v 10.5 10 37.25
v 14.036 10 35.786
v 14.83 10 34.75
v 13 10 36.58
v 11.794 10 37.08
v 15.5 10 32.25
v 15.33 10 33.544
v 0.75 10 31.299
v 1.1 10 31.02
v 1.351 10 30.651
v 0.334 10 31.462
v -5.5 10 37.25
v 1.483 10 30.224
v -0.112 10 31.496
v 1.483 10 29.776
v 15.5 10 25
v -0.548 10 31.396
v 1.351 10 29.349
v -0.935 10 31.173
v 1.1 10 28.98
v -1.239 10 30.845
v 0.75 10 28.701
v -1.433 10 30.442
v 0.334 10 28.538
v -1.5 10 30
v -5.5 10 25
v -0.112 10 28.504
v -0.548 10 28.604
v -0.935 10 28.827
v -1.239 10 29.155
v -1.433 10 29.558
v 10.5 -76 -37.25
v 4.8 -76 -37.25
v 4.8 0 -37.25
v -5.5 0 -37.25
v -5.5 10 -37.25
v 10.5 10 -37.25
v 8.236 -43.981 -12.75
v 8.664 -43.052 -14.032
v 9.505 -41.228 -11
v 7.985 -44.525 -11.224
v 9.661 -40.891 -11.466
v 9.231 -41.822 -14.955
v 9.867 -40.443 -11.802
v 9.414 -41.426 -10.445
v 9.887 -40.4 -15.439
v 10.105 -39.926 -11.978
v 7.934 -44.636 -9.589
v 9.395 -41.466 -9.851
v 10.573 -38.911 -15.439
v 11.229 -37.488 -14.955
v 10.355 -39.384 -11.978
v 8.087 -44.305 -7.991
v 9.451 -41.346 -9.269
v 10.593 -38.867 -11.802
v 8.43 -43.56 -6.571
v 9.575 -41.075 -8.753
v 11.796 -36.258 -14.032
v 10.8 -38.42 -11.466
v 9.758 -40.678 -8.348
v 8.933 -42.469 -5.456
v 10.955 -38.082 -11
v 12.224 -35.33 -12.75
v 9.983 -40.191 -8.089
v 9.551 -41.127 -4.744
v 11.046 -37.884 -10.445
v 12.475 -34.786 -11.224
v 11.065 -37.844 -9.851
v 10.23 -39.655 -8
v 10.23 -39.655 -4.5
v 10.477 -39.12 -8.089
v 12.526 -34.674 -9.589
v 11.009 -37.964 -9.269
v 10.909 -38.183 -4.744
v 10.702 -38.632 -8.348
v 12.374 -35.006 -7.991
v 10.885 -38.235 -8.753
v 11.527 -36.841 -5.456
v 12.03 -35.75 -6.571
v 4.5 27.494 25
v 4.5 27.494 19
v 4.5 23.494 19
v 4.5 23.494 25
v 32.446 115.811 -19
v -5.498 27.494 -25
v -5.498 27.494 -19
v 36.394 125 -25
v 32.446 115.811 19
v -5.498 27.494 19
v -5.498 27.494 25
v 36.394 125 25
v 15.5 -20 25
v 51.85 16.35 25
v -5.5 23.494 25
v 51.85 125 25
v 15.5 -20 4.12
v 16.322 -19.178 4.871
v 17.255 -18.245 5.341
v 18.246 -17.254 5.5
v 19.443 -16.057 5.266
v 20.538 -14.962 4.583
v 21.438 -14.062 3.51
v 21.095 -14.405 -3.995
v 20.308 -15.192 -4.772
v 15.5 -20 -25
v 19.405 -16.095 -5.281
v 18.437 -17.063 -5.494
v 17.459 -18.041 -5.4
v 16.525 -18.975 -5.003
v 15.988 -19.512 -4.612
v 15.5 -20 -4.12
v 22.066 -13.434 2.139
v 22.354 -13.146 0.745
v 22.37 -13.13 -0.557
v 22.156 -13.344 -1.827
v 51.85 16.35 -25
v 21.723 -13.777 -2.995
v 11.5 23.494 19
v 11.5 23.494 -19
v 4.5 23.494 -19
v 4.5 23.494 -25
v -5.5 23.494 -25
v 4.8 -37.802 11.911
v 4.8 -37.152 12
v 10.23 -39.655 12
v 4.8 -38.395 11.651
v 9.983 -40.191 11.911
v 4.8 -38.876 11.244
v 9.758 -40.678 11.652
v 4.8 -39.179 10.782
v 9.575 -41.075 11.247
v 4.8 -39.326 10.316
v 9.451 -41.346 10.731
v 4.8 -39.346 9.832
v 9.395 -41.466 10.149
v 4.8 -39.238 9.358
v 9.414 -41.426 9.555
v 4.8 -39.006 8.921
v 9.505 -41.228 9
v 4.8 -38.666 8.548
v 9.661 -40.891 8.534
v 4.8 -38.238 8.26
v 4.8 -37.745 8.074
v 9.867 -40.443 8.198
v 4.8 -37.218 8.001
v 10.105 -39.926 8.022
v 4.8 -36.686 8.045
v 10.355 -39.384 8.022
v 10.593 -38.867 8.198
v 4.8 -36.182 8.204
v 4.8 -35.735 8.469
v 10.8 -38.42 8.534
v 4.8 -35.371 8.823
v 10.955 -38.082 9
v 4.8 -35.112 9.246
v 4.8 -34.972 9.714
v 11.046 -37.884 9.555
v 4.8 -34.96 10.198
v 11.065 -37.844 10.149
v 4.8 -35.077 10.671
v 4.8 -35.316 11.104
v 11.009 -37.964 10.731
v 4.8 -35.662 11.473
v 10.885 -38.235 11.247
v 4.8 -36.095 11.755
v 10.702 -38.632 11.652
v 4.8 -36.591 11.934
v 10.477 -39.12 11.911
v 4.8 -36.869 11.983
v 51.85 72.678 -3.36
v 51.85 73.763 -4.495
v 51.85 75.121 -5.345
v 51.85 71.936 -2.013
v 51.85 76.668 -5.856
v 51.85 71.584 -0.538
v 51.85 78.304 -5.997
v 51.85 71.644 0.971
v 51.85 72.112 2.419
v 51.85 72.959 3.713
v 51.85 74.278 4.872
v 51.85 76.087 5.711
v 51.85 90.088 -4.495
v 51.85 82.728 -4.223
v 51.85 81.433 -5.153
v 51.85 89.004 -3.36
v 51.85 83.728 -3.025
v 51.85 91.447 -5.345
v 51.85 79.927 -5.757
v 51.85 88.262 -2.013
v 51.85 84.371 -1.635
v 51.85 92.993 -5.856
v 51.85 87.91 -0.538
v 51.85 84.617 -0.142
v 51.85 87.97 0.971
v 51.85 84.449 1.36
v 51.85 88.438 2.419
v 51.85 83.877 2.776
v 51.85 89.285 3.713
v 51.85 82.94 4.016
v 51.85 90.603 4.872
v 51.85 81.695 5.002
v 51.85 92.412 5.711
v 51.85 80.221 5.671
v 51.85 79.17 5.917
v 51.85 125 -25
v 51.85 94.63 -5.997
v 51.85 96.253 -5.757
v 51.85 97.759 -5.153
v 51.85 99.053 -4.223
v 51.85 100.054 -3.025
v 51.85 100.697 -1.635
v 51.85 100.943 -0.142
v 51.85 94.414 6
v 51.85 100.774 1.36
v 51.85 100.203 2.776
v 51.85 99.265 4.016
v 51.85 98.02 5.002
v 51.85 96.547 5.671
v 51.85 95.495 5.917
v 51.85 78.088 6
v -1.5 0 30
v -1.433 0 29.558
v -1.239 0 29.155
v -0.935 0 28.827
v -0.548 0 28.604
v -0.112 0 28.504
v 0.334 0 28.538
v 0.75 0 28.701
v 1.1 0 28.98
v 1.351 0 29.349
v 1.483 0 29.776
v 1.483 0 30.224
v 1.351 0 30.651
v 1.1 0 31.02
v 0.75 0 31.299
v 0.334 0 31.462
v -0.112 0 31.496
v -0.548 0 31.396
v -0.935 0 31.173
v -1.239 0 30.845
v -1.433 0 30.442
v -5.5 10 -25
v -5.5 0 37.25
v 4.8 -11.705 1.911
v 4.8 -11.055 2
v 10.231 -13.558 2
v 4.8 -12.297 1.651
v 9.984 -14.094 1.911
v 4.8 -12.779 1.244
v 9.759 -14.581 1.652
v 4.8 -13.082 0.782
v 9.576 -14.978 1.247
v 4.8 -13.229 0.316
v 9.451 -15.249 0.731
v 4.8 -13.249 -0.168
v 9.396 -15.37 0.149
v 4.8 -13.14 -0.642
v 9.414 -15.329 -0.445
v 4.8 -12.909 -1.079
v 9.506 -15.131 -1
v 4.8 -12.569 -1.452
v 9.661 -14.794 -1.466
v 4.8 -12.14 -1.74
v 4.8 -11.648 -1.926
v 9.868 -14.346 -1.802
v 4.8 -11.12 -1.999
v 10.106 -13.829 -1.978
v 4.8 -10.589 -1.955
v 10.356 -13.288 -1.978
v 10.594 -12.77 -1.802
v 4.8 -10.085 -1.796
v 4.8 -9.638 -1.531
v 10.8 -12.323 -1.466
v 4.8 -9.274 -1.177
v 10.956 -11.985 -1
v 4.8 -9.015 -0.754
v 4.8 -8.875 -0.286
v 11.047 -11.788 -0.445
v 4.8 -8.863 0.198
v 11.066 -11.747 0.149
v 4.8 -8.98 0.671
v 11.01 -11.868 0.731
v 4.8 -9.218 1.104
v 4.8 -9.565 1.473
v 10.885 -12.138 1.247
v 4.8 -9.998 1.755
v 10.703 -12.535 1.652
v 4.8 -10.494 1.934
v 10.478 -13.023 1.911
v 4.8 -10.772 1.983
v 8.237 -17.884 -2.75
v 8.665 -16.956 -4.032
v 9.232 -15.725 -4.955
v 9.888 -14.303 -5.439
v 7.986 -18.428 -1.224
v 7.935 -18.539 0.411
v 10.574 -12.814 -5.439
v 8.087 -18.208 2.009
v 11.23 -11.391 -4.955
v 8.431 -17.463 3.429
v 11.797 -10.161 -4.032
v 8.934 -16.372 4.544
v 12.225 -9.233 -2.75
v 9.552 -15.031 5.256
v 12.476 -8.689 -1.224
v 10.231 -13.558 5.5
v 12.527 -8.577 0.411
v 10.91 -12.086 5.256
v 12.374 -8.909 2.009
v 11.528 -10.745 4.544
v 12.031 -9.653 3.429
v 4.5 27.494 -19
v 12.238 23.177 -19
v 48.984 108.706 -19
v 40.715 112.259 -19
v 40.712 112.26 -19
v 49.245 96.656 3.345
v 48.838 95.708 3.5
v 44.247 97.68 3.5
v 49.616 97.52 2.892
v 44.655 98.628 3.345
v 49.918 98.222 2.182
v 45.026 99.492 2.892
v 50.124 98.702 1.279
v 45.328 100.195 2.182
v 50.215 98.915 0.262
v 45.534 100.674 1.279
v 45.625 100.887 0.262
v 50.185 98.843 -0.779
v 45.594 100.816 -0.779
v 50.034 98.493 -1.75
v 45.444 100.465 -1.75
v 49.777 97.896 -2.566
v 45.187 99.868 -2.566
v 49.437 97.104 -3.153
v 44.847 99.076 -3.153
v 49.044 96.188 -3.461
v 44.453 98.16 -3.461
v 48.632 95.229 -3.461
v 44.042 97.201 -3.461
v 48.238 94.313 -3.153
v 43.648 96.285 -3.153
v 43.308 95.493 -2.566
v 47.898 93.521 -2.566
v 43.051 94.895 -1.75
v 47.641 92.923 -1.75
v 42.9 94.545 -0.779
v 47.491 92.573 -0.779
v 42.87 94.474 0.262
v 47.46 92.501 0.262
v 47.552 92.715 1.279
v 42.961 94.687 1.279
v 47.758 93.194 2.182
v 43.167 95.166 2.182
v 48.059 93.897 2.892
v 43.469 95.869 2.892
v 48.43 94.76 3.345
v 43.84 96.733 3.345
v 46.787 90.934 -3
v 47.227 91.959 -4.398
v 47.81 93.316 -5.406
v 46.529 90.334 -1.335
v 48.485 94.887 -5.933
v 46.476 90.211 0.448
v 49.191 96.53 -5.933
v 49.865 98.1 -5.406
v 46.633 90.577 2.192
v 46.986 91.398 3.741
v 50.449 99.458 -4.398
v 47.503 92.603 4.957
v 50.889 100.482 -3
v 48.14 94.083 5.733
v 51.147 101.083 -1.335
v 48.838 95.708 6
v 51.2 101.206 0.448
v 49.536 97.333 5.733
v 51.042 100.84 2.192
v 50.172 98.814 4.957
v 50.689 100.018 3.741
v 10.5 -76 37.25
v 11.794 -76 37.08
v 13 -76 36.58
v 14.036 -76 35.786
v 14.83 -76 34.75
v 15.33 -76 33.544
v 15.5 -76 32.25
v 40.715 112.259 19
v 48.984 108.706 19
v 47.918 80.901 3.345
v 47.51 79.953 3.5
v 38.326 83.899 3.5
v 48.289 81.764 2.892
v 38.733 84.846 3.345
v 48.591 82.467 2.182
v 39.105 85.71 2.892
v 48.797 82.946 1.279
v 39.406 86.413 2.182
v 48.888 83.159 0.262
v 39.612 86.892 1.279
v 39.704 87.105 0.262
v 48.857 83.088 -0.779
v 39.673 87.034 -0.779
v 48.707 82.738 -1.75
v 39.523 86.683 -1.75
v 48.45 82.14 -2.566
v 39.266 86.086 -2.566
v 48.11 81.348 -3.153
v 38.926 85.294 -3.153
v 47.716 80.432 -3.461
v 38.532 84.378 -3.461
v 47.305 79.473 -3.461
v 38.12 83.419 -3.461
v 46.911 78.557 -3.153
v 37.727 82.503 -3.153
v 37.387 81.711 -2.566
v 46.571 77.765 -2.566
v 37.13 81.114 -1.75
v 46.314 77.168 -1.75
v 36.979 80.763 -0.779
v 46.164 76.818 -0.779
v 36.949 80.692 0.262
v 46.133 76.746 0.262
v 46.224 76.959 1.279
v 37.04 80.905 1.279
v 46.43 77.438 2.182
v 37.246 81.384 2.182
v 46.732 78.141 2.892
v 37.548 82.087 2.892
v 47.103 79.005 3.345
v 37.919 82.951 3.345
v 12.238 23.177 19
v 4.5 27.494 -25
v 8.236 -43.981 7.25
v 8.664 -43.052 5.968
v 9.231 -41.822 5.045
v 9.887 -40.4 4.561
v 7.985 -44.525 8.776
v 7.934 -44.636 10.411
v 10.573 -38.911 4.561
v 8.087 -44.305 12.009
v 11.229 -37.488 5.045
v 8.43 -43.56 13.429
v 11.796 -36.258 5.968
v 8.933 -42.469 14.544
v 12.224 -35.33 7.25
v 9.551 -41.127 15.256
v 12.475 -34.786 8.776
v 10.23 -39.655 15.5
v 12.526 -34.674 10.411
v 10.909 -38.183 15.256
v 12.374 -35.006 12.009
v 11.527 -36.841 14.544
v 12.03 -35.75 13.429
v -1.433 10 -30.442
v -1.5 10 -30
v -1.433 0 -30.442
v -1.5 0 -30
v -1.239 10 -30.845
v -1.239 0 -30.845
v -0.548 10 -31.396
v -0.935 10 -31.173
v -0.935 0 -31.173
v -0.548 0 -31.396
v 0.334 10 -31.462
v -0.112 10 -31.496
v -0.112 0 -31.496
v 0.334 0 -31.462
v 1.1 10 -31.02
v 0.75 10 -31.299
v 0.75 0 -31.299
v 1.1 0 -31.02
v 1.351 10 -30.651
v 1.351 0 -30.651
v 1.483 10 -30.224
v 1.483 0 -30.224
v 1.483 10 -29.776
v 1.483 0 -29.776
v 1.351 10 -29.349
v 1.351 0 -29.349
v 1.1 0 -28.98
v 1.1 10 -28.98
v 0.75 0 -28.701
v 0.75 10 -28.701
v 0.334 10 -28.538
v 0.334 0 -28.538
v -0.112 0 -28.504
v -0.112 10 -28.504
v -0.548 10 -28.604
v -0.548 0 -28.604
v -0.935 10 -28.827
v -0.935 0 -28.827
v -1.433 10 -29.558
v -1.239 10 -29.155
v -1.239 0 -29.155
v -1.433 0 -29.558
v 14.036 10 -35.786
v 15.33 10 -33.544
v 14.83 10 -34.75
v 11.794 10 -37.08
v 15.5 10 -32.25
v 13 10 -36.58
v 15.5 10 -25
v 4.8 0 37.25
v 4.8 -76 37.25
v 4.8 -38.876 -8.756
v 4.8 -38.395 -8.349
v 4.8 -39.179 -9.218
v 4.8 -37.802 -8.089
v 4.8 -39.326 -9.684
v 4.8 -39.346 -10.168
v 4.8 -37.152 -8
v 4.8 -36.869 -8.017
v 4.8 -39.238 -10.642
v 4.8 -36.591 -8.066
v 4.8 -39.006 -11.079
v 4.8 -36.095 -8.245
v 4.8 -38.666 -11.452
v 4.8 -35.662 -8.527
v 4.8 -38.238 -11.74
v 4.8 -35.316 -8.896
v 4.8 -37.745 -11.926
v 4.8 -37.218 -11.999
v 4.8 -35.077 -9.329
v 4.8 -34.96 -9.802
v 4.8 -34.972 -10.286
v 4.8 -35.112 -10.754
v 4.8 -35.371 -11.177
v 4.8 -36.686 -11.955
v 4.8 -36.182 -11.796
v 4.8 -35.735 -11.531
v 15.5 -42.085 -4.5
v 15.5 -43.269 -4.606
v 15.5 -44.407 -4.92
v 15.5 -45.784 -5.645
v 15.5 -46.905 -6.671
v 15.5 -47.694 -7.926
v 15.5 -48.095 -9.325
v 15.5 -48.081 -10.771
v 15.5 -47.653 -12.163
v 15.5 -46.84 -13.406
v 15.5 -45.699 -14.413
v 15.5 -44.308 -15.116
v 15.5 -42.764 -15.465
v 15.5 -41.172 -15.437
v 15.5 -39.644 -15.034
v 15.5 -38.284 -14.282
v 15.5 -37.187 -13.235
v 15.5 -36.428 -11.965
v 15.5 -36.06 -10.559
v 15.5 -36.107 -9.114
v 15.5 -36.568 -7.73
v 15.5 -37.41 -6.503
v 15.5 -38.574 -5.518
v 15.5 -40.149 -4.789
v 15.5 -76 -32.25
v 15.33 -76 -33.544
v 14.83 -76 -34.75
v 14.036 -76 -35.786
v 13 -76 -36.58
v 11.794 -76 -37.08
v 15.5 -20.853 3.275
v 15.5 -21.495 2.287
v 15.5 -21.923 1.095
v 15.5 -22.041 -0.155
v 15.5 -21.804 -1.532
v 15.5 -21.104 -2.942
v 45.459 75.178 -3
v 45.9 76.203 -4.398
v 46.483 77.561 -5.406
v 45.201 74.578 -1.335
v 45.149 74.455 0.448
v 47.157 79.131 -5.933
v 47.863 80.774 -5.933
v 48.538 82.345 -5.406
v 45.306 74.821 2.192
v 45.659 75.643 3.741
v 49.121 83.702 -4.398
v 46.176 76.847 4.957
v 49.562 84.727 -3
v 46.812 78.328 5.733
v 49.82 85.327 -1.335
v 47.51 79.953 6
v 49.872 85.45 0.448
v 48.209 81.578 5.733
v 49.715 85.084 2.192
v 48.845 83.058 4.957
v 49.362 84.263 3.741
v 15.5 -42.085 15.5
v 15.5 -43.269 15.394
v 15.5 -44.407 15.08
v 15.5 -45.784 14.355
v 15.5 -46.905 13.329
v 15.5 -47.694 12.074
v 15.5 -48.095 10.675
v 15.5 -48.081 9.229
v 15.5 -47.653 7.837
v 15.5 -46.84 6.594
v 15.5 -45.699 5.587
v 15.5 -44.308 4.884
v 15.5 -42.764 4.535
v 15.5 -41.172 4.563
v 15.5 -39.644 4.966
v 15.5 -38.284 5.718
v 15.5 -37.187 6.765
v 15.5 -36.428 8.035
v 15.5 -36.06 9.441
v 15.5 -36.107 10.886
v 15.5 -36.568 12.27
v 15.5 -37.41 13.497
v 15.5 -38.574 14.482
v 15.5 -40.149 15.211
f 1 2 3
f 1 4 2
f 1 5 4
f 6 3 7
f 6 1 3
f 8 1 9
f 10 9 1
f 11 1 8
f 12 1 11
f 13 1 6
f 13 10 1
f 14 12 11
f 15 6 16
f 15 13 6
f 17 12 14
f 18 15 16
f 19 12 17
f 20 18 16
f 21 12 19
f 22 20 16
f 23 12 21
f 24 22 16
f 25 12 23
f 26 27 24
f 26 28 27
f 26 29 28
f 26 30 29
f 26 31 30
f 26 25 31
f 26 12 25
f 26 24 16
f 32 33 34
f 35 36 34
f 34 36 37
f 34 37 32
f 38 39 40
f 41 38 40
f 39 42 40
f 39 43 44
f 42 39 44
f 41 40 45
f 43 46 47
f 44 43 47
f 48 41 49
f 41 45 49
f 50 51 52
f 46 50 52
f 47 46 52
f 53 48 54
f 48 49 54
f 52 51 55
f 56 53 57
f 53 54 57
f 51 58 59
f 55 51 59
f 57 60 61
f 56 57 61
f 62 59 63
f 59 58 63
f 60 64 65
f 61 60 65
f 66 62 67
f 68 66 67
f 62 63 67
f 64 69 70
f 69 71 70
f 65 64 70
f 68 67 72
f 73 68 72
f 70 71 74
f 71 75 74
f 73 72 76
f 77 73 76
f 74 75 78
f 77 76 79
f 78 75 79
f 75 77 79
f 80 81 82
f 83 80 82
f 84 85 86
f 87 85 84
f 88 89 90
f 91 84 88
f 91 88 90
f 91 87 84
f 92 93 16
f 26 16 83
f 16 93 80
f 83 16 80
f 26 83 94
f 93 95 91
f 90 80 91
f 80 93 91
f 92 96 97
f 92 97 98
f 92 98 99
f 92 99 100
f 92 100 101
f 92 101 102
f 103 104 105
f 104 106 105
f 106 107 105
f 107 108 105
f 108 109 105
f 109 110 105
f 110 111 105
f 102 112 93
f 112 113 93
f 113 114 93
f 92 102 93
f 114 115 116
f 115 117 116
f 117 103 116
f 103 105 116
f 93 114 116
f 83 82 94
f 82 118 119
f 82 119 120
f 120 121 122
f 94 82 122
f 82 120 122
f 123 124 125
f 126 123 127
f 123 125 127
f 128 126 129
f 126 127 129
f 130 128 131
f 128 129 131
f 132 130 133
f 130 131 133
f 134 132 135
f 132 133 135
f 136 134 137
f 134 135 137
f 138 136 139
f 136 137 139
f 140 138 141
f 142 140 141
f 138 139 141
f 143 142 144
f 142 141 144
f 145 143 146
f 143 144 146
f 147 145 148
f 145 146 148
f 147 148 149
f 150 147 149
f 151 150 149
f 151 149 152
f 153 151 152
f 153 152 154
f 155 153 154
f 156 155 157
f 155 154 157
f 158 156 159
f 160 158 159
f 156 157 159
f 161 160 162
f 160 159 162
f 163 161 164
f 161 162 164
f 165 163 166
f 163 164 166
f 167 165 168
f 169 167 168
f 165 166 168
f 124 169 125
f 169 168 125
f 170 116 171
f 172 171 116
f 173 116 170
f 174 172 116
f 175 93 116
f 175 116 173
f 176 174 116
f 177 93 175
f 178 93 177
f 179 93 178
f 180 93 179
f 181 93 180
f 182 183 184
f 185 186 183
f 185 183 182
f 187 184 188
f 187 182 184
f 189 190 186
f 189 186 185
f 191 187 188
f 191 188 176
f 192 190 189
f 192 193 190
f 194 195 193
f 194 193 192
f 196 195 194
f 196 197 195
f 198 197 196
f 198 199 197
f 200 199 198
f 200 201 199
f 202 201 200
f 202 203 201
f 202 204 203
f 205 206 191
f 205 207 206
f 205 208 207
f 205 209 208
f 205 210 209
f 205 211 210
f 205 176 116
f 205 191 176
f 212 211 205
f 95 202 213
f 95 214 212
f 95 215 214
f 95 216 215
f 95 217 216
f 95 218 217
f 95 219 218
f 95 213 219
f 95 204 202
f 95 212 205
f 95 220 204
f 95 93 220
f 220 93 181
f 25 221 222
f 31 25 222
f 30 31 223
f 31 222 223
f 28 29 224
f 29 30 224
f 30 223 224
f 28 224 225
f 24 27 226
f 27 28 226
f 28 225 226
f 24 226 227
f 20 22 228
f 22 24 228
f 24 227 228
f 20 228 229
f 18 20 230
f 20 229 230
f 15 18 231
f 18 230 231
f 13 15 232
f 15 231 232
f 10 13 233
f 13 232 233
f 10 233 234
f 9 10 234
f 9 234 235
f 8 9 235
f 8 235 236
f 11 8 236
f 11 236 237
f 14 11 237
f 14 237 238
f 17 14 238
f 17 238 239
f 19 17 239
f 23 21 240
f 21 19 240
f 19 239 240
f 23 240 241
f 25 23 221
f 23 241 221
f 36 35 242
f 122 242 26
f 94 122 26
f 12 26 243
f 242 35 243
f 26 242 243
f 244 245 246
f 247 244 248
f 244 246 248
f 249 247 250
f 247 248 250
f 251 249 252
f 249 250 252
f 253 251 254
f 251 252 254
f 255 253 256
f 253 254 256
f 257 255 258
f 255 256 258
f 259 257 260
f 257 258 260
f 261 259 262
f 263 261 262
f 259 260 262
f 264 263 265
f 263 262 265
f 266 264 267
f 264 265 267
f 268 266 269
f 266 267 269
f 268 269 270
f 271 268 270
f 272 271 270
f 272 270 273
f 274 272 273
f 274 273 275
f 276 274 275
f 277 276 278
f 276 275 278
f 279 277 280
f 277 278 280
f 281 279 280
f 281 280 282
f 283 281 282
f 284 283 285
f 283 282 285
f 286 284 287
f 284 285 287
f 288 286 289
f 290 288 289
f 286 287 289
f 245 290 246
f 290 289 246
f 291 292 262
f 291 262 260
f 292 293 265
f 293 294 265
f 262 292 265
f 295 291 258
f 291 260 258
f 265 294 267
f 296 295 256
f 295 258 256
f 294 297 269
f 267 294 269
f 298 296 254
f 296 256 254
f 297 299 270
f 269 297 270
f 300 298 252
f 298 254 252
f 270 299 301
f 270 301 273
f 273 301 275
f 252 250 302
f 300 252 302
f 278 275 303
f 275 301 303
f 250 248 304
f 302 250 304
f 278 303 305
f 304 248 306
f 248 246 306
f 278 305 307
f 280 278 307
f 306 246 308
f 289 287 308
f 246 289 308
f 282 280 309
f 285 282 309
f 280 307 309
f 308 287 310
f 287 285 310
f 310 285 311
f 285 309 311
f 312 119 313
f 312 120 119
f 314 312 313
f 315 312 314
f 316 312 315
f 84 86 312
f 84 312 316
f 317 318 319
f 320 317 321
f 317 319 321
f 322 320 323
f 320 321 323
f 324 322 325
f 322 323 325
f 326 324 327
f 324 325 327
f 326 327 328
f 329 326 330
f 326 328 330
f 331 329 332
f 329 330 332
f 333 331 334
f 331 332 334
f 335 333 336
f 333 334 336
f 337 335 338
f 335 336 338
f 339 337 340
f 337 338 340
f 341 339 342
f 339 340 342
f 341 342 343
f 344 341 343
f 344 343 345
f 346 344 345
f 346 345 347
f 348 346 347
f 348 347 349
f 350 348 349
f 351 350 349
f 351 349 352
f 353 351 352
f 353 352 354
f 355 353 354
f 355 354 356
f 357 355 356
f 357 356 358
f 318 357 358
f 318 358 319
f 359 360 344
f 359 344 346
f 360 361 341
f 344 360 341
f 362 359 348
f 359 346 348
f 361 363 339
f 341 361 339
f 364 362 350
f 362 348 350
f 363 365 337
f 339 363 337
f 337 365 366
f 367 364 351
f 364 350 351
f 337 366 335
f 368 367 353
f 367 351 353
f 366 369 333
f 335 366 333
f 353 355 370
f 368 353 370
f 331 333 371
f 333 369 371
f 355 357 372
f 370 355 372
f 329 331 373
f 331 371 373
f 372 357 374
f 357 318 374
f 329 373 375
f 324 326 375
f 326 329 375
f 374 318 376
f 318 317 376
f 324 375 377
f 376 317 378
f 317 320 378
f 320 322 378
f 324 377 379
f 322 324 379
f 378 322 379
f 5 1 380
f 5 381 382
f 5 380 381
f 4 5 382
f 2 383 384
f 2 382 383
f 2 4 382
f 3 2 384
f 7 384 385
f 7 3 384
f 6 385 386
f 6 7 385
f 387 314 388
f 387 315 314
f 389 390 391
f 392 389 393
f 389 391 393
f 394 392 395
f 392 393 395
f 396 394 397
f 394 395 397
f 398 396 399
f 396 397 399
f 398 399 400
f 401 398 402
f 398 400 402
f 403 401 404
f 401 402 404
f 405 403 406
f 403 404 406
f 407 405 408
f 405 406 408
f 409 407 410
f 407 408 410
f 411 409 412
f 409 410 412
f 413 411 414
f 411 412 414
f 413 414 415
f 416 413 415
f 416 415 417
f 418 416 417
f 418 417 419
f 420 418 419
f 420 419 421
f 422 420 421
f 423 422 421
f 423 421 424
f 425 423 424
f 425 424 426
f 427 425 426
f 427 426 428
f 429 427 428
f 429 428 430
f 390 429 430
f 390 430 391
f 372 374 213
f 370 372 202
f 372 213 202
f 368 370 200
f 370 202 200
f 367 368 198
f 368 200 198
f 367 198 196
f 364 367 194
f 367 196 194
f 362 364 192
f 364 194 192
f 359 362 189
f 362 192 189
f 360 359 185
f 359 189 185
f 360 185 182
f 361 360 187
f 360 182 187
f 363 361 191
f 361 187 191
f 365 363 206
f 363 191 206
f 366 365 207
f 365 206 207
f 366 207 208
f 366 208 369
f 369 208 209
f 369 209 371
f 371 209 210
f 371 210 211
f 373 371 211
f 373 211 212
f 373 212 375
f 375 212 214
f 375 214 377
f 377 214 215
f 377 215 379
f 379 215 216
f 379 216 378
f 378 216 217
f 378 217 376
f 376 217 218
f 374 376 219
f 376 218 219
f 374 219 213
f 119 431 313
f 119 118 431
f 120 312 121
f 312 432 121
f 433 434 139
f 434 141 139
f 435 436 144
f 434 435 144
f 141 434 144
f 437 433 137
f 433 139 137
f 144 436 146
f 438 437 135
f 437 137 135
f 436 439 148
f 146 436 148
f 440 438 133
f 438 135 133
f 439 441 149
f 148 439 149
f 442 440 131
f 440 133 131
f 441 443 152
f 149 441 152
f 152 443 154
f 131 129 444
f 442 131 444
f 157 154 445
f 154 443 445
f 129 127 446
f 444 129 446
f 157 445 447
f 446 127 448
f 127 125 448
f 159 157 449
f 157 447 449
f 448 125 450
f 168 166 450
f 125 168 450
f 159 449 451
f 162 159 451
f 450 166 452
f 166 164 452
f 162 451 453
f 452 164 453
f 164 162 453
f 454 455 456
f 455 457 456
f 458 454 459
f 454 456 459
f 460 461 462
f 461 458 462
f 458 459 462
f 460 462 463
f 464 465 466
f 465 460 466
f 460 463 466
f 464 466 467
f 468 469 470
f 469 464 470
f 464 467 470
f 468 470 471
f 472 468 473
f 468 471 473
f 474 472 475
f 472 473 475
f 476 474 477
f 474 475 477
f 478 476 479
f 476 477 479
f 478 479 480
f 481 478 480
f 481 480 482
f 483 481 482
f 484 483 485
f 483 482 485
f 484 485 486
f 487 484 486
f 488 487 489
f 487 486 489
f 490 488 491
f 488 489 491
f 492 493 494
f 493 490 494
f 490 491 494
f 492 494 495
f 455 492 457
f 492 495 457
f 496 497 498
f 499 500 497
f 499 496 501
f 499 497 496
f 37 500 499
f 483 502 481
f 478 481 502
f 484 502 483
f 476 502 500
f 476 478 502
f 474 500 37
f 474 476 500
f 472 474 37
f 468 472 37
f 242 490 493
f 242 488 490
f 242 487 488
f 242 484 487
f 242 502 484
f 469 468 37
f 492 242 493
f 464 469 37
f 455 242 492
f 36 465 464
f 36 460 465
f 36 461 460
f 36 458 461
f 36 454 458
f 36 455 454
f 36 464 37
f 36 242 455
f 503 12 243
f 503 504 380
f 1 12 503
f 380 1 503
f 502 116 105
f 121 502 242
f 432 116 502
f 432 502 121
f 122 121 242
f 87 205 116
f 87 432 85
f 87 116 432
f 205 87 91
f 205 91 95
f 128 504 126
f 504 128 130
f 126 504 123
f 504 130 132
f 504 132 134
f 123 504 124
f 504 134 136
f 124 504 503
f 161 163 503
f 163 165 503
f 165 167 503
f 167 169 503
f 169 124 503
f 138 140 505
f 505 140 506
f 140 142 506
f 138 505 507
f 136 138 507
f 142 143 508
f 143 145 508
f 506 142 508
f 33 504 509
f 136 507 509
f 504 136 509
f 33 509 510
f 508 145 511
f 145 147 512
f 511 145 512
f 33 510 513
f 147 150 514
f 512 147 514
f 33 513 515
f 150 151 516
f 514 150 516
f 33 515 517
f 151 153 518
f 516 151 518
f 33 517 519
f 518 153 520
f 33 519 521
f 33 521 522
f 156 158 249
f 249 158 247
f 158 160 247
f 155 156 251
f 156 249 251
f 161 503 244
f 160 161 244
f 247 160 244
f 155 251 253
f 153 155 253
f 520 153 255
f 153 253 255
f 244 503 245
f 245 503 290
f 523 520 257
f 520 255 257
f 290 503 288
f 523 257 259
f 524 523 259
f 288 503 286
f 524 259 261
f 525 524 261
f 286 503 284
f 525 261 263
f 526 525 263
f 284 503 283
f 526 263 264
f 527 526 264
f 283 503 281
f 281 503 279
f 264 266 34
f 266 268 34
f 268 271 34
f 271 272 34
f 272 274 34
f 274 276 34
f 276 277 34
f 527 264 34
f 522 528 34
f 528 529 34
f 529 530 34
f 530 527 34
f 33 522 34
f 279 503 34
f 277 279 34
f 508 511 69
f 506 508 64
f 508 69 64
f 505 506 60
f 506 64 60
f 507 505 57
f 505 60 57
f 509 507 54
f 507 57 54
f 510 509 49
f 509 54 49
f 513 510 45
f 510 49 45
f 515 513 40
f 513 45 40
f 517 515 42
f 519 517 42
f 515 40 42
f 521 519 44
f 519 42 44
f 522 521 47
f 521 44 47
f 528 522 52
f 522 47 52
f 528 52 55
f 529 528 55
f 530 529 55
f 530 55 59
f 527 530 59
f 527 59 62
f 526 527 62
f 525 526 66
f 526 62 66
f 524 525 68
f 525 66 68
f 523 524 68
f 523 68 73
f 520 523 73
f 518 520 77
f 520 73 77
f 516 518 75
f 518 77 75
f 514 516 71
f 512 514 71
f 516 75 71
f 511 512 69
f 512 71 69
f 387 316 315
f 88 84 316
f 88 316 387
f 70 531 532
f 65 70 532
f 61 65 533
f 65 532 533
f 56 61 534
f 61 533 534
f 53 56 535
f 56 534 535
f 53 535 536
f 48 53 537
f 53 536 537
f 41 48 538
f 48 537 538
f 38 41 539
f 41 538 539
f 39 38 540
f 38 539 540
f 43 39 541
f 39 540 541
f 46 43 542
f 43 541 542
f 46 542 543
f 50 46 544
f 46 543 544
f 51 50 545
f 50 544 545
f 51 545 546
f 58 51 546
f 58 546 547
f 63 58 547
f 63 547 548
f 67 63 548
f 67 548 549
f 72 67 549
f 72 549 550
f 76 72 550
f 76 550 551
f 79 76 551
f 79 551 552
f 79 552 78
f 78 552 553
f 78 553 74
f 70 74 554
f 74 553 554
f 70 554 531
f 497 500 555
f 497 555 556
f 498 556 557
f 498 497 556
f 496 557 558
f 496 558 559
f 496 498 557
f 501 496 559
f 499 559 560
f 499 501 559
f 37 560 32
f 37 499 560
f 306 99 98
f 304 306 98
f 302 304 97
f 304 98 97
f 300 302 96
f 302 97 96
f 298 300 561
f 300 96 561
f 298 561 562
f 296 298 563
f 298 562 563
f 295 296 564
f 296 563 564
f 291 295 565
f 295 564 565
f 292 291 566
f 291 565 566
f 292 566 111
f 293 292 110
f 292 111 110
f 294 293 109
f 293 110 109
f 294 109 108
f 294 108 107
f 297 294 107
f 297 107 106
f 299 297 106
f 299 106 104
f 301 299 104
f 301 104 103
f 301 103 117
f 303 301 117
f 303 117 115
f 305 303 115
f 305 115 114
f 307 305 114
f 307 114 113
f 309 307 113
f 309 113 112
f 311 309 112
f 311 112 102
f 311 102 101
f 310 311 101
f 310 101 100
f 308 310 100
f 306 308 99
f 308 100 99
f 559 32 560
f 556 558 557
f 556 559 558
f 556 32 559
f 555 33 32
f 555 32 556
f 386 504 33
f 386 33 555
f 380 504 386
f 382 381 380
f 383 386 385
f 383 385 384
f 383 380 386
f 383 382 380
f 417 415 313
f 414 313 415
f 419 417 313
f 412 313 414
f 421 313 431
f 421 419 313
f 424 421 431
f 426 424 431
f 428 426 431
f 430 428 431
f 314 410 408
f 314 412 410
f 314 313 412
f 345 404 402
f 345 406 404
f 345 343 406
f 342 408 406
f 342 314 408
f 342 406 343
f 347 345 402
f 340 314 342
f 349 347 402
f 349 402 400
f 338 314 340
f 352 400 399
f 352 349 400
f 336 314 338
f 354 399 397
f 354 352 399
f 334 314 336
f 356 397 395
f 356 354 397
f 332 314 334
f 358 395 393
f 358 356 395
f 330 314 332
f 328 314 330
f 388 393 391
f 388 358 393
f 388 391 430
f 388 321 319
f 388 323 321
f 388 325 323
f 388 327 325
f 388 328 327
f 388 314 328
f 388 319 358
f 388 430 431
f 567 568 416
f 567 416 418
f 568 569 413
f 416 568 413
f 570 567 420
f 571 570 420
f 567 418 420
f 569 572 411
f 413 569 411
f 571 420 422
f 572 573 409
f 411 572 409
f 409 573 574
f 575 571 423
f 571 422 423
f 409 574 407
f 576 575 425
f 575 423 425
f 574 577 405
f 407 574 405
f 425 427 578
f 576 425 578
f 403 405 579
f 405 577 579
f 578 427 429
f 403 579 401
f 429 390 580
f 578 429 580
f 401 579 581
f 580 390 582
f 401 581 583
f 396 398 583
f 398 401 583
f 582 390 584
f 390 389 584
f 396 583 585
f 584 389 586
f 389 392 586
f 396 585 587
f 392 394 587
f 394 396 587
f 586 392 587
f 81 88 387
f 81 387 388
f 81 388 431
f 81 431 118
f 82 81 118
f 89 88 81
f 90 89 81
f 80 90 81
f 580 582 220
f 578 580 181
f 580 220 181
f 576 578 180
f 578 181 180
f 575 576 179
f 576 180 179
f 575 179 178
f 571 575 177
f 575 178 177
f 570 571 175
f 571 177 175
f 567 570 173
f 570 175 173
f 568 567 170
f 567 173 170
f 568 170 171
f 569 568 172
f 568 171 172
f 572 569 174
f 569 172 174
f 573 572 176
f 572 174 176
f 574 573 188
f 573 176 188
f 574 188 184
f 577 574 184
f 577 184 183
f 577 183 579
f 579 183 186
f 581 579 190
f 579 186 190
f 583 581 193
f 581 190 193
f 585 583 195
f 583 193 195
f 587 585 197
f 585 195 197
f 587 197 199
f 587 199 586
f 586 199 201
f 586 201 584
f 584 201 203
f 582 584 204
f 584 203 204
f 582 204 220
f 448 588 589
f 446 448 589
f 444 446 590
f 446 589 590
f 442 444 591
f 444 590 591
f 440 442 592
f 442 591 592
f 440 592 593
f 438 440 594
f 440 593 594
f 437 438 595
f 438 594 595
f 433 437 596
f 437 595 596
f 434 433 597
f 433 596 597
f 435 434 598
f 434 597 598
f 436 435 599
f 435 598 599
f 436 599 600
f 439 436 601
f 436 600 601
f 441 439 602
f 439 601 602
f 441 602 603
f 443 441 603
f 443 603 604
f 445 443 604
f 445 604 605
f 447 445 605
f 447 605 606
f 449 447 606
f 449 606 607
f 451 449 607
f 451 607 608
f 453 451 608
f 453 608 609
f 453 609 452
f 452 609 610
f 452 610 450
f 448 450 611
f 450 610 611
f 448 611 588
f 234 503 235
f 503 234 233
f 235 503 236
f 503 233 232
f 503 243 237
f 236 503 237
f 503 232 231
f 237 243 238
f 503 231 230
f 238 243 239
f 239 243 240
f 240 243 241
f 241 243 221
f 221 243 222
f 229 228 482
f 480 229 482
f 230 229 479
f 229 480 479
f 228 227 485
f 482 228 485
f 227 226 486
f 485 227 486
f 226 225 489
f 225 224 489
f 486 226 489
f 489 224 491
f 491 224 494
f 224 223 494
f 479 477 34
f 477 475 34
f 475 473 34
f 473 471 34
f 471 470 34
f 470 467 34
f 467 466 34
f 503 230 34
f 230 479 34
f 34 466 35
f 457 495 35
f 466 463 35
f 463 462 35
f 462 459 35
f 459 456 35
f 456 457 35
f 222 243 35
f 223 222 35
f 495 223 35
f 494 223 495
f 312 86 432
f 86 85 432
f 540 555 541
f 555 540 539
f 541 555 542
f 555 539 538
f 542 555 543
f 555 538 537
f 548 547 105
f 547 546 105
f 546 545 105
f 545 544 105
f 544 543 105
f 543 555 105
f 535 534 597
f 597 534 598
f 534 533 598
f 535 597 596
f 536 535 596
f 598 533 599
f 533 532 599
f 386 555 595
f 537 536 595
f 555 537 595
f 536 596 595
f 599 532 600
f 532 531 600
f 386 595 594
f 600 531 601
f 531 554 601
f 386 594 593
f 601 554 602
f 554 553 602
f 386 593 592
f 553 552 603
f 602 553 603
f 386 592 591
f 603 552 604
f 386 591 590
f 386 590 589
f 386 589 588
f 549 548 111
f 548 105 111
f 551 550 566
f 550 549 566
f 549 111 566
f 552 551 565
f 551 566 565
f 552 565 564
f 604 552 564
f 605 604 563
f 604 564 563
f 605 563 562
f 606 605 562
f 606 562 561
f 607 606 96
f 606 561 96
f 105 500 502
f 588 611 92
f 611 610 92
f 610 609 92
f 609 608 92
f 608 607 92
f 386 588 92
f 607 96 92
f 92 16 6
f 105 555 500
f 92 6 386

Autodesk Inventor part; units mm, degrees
sketch "Sketch1" plane through (0, 0, 0) normal (0, 1, 0) x (-1, 0, 0)
  line L0 (5.5, 37.25) -> (-5.5, 37.25)
  line L1 (-5.5, 37.25) -> (-5.5, -37.25)
  line L2 (-5.5, -37.25) -> (5.5, -37.25)
  line L3 (5.5, -37.25) -> (5.5, 37.25)
  line L4 (5.5, 37.25) -> (-5.5, -37.25) construction
  line L5 (-5.5, 37.25) -> (5.5, -37.25) construction
  circle A0 centre (0, 30) radius 1.5
  line L6 (5.5, 0) -> (-5.5, 0)
  circle A1 centre (0, -30) radius 1.5
  line L7 (-5.5, -25) -> (5.5, -25)
  line L8 (5.5, -25) -> (5.5, 25)
  line L9 (5.5, 25) -> (-5.5, 25)
  line L10 (-5.5, 25) -> (-5.5, -25)
  line L11 (-5.5, -25) -> (5.5, 25) construction
  line L12 (5.5, -25) -> (-5.5, 25) construction
  point P0 (0, 0)
  dimension "d0" = 11
  dimension "d1" = 74.5
  dimension "d2" = 3
  dimension "d3" = 7.25
  dimension "d28" = 50
extrude "Extrusion1" add sketch "Sketch1" along normal blind 10
sketch "Sketch2" plane through (5.5, 0, 37.25) normal (1, 0, 0) x (0, 0, -1)
  line L0 (0, 10) -> (74.5, 10) projected
  line L1 (0, 0) -> (74.5, 0) projected
  line L2 (0, 10) -> (74.5, 10)
  line L3 (74.5, 10) -> (74.5, 0)
  line L4 (74.5, 0) -> (0, 0)
  line L5 (0, 0) -> (0, 10)
  point P0 (37.25, 0)
extrude "Extrusion2" add sketch "Sketch2" along normal blind 10
sketch "Sketch3" plane through (0, 0, 0) normal (0, -1, 0) x (1, 0, 0)
  line L0 (-5.5, 37.25) -> (15.5, 37.25) projected
  line L1 (-5.5, -37.25) -> (15.5, -37.25) projected
  line L2 (15.5, 37.25) -> (4.8, 37.25)
  line L3 (4.8, 37.25) -> (4.8, -37.25)
  line L4 (4.8, -37.25) -> (15.5, -37.25)
  line L5 (15.5, -37.25) -> (15.5, 37.25)
  point P0 (0, 0)
  dimension "d9" = 10.7
extrude "Extrusion3" add sketch "Sketch3" along normal blind 76
ref_plane "Work Plane1" through (15.5, -76, -37.25) normal (-0.9081432, 0.4186597, 0) x (0, 0, 1)
ref_plane "Work Plane3" through (10.9593, -73.9067, -37.25) normal (-0.9081432, 0.4186597, 0) x (0, 0, 1)
sketch "Sketch4" plane through (10.9593, -73.9067, -37.25) normal (-0.9081432, 0.4186597, 0) x (0, 0, 1)
  circle A0 centre (37.25, 54.5) radius 2
  circle A1 centre (37.25, 54.5) radius 5.5
  circle A2 centre (27.25, 30.8) radius 2
  circle A3 centre (27.25, 30.8) radius 5.5
  line L0 (37.25, 62.5297) -> (37.25, 0)
  line L1 (0, 0) -> (74.5, 0) projected
  circle A4 centre (47.25, 30.8) radius 5.5
  circle A5 centre (47.25, 30.8) radius 2
  point P0 (37.25, 0)
  dimension "d13" = 4
  dimension "d14" = 11
  dimension "d15" = 4
  dimension "d16" = 11
  dimension "d19" = 10
  dimension "d20" = 23.7
  dimension "d23" = 54.5
extrude "Extrusion4" cut sketch "Sketch4" along normal blind 15 contours A0 L0 | A0 L0 A1 | L0 A0 | A0 L0 A1 | A2 | A3 | A4 | A5
extrude "Extrusion11" cut sketch "Sketch4" along normal blind 25.925 contours A0 L0 | A0 L0 A1 | L0 A0 | A0 L0 A1
extrude "Extrusion6" cut sketch "Sketch4" along normal through all contours A0 L0 | L0 A0 | A2 | A5
extrude "Extrusion7" add sketch "Sketch1" along normal blind 125 contours L3 L6 L1 L9 | L3 L7 L1 L6
sketch "Sketch5" plane through (5.5, 10, -25) normal (1, 0, 0) x (0, 0, -1)
  line L0 (0, 0) -> (0, 115) projected
  line L1 (0, 115) -> (0, 0)
  line L2 (0, 0) -> (-50, 0)
  line L3 (-50, 0) -> (-50, 115)
  line L4 (0, 115) -> (-50, 115)
  point P0 (-25, -10)
extrude "Extrusion8" add sketch "Sketch5" along normal blind 40
chamfer "Chamfer1" distance 40 angle 23.25 1 edges at (-5.5, 125, 0) measured on face at (-5.5, 48.3333, -8.3333)
chamfer "Chamfer2" distance 30 distance2 30 1 edges at (15.5, 10, 0)
sketch "Sketch8" plane through (11.6854, 125, -25) normal (-0.9187912, 0.3947439, 0) x (0, 0, 1)
  line L0 (0, 0) -> (0, 13.3481) projected
  line L1 (-12.25, -121.6327) -> (62.25, -121.6327) projected
  line L2 (0, 13.3481) -> (50, 13.3481)
  line L3 (50, 13.3481) -> (50, -121.6327)
  line L4 (50, -121.6327) -> (0, -121.6327)
  line L5 (0, -121.6327) -> (0, 13.3481)
  point P0 (25, -119.4616)
  point P1 (0, 0)
  dimension "d59" = 50
extrude "Extrusion12" cut sketch "Sketch8" against normal blind 22.7
ref_plane "Work Plane4" through (64.6996, 102.2233, -25) normal (-0.9187912, 0.3947439, 0) x (0, 0, 1)
ref_plane "Work Plane5" through (32.5419, 116.0393, -25) normal (-0.9187912, 0.3947439, 0) x (0, 0, 1)
ref_plane "Work Plane6" through (-5.5, 27.4944, -18.625) normal (0.3947439, 0.9187912, 0) x (0, 0, -1)
sketch "Sketch11" plane through (15.5, 10, -25) normal (0, 0, -1) x (-1, 0, 0)
  line L0 (21, 17.4944) -> (-6.8294, 82.2691) projected
  line L1 (21, 17.4944) -> (11, 17.4944)
  line L2 (11, 17.4944) -> (11, 13.4944)
  line L3 (11, 13.4944) -> (21, 13.4944)
  line L4 (21, 13.4944) -> (21, 17.4944)
  point P0 (15.5, -10)
  dimension "d76" = 10
  dimension "d77" = 4
extrude "Extrusion15" cut sketch "Sketch11" against normal blind 70.5
fillet "Fillet1" radius 5 2 edges at (15.5, -33, 37.25) (15.5, -33, -37.25)
sketch "Sketch12" plane through (32.5419, 116.0393, -25) normal (-0.9187912, 0.3947439, 0) x (0, 0, 1)
  line L0 (6, -0.2473) -> (44, -0.2473)
  line L1 (44, -0.2473) -> (44, -96.0989)
  line L2 (6, -96.0989) -> (6, -0.2473)
  line L3 (0, -96.3711) -> (0, 9.7527) projected
  line L4 (50, 9.7527) -> (50, -96.3711) projected
  line L5 (0, 9.7527) -> (50, 9.7527) projected
  line L6 (44, -96.0989) -> (44, -96.8375)
  line L7 (44, -96.8375) -> (6, -96.8375)
  line L8 (6, -96.8375) -> (6, -96.0989)
  point P0 (25, -119.4616)
  dimension "d81" = 6
  dimension "d82" = 6
  dimension "d83" = 10
extrude "Extrusion16" cut sketch "Sketch12" against normal blind 9
sketch "Sketch14" plane through (4.5, 23.4944, -25) normal (-1, 0, 0) x (0, 0, 1)
  line L0 (6, 4) -> (6, 92.3177) projected
  line L1 (6, 4) -> (44, 4)
  line L2 (44, 4) -> (44, 0)
  line L3 (44, 0) -> (6, 0)
  line L4 (6, 0) -> (6, 4)
  point P0 (25, -23.4944)
  point P1 (6, 19)
extrude "Extrusion18" cut sketch "Sketch14" against normal blind 7
sketch "Sketch15" plane through (15.5, 10, -25) normal (0, 0, -1) x (-1, 0, 0)
  line L0 (-30, 115) -> (-39.6875, 115)
  line L1 (-39.6875, 115) -> (-39.6875, 9.6875)
  line L2 (-30, 0) -> (-39.6875, 9.6875)
  line L3 (0, -30) -> (-30, 0) projected
  line L4 (21, 13.4944) -> (11, 13.4944) projected
  line L5 (11, 13.4944) -> (11, 17.4944) projected
  line L6 (11, 17.4944) -> (21, 17.4944) projected
  line L7 (21, 17.4944) -> (-20.8917, 115) construction
  line L8 (-20.8917, 115) -> (-30, 115) projected
  line L9 (-30, 0) -> (-30, 115) projected
  line L10 (0, -30) -> (-30, 0) projected
  line L11 (0, 0) -> (0, -30) projected
  line L12 (21, 0) -> (0, 0) projected
  line L13 (21, 0) -> (21, 13.4944) projected
  point P0 (15.5, -10)
  dimension "d91" = 135
extrude "Extrusion19" add sketch "Sketch15" against normal blind 50
sketch "Sketch16" plane through (40.811, 112.4866, -25) normal (-0.9187912, 0.3947439, 0) x (0, 0, 1)
  line L0 (6, -96.3711) -> (6, -0.2473) projected
  line L1 (44, -93.3357) -> (6, -93.3357) projected
  line L2 (6, -0.2473) -> (44, -0.2473)
  line L3 (44, -0.2473) -> (44, -93.3357)
  line L4 (44, -93.3357) -> (6, -93.3357)
  line L5 (6, -93.3357) -> (6, -0.2473)
  point P0 (25, -119.4616)
extrude "Extrusion20" cut sketch "Sketch16" against normal blind 9
sketch "Sketch18" plane through (49.0802, 108.9339, -25) normal (-0.9187912, 0.3947439, 0) x (0, 0, 1)
  line L0 (6, -0.2473) -> (44, -0.2473) construction
  line L1 (25, -0.2473) -> (25, -12.2473) construction
  line L2 (6, -93.3357) -> (6, -0.2473) construction
  line L3 (44, -0.2473) -> (44, -93.3357) construction
  circle A0 centre (25, -12.2473) radius 3.5
  circle A1 centre (25, -27.2473) radius 3.5
  point P0 (25, -119.4616)
  dimension "d99" = 12
  dimension "d100" = 19
  dimension "d103" = 7
  dimension "d104" = 7
  dimension "d105" = 15
extrude "Extrusion22" cut sketch "Sketch18" against normal through all
ref_plane "Work Plane8" through (72.0499, 99.0653, -25) normal (-0.9187912, 0.3947439, 0) x (0, 0, 1)
sketch "Sketch19" plane through (72.0499, 99.0653, -25) normal (-0.9187912, 0.3947439, 0) x (0, 0, 1)
  circle A0 centre (25, -12.2473) radius 3.5 projected
  circle A1 centre (25, -12.2473) radius 6
  circle A2 centre (25, -27.2473) radius 3.5 projected
  circle A3 centre (25, -27.2473) radius 6
  point P0 (25, -119.4616)
  dimension "d109" = 12
  dimension "d110" = 12
extrude "Extrusion23" cut sketch "Sketch19" along normal blind 15 contours A3
extrude "Extrusion24" cut sketch "Sketch19" along normal blind 20 contours A1
sketch "Sketch20" plane through (-5.5, 10, 25) normal (0, 0, 1) x (1, 0, 0)
  line L0 (21, -30) -> (60.6875, 9.6875) projected
  line L1 (57.35, 6.35) -> (57.35, 115)
  line L2 (41.8917, 115) -> (60.6875, 115) projected
  line L3 (57.35, 115) -> (87.3125, 115)
  line L4 (87.3125, 115) -> (90.4875, 6.35)
  line L5 (90.4875, 6.35) -> (57.35, 6.35)
  point P0 (5.5, -10)
extrude "Extrusion25" cut sketch "Sketch20" against normal through all
properties part number "Camera Bracket"
